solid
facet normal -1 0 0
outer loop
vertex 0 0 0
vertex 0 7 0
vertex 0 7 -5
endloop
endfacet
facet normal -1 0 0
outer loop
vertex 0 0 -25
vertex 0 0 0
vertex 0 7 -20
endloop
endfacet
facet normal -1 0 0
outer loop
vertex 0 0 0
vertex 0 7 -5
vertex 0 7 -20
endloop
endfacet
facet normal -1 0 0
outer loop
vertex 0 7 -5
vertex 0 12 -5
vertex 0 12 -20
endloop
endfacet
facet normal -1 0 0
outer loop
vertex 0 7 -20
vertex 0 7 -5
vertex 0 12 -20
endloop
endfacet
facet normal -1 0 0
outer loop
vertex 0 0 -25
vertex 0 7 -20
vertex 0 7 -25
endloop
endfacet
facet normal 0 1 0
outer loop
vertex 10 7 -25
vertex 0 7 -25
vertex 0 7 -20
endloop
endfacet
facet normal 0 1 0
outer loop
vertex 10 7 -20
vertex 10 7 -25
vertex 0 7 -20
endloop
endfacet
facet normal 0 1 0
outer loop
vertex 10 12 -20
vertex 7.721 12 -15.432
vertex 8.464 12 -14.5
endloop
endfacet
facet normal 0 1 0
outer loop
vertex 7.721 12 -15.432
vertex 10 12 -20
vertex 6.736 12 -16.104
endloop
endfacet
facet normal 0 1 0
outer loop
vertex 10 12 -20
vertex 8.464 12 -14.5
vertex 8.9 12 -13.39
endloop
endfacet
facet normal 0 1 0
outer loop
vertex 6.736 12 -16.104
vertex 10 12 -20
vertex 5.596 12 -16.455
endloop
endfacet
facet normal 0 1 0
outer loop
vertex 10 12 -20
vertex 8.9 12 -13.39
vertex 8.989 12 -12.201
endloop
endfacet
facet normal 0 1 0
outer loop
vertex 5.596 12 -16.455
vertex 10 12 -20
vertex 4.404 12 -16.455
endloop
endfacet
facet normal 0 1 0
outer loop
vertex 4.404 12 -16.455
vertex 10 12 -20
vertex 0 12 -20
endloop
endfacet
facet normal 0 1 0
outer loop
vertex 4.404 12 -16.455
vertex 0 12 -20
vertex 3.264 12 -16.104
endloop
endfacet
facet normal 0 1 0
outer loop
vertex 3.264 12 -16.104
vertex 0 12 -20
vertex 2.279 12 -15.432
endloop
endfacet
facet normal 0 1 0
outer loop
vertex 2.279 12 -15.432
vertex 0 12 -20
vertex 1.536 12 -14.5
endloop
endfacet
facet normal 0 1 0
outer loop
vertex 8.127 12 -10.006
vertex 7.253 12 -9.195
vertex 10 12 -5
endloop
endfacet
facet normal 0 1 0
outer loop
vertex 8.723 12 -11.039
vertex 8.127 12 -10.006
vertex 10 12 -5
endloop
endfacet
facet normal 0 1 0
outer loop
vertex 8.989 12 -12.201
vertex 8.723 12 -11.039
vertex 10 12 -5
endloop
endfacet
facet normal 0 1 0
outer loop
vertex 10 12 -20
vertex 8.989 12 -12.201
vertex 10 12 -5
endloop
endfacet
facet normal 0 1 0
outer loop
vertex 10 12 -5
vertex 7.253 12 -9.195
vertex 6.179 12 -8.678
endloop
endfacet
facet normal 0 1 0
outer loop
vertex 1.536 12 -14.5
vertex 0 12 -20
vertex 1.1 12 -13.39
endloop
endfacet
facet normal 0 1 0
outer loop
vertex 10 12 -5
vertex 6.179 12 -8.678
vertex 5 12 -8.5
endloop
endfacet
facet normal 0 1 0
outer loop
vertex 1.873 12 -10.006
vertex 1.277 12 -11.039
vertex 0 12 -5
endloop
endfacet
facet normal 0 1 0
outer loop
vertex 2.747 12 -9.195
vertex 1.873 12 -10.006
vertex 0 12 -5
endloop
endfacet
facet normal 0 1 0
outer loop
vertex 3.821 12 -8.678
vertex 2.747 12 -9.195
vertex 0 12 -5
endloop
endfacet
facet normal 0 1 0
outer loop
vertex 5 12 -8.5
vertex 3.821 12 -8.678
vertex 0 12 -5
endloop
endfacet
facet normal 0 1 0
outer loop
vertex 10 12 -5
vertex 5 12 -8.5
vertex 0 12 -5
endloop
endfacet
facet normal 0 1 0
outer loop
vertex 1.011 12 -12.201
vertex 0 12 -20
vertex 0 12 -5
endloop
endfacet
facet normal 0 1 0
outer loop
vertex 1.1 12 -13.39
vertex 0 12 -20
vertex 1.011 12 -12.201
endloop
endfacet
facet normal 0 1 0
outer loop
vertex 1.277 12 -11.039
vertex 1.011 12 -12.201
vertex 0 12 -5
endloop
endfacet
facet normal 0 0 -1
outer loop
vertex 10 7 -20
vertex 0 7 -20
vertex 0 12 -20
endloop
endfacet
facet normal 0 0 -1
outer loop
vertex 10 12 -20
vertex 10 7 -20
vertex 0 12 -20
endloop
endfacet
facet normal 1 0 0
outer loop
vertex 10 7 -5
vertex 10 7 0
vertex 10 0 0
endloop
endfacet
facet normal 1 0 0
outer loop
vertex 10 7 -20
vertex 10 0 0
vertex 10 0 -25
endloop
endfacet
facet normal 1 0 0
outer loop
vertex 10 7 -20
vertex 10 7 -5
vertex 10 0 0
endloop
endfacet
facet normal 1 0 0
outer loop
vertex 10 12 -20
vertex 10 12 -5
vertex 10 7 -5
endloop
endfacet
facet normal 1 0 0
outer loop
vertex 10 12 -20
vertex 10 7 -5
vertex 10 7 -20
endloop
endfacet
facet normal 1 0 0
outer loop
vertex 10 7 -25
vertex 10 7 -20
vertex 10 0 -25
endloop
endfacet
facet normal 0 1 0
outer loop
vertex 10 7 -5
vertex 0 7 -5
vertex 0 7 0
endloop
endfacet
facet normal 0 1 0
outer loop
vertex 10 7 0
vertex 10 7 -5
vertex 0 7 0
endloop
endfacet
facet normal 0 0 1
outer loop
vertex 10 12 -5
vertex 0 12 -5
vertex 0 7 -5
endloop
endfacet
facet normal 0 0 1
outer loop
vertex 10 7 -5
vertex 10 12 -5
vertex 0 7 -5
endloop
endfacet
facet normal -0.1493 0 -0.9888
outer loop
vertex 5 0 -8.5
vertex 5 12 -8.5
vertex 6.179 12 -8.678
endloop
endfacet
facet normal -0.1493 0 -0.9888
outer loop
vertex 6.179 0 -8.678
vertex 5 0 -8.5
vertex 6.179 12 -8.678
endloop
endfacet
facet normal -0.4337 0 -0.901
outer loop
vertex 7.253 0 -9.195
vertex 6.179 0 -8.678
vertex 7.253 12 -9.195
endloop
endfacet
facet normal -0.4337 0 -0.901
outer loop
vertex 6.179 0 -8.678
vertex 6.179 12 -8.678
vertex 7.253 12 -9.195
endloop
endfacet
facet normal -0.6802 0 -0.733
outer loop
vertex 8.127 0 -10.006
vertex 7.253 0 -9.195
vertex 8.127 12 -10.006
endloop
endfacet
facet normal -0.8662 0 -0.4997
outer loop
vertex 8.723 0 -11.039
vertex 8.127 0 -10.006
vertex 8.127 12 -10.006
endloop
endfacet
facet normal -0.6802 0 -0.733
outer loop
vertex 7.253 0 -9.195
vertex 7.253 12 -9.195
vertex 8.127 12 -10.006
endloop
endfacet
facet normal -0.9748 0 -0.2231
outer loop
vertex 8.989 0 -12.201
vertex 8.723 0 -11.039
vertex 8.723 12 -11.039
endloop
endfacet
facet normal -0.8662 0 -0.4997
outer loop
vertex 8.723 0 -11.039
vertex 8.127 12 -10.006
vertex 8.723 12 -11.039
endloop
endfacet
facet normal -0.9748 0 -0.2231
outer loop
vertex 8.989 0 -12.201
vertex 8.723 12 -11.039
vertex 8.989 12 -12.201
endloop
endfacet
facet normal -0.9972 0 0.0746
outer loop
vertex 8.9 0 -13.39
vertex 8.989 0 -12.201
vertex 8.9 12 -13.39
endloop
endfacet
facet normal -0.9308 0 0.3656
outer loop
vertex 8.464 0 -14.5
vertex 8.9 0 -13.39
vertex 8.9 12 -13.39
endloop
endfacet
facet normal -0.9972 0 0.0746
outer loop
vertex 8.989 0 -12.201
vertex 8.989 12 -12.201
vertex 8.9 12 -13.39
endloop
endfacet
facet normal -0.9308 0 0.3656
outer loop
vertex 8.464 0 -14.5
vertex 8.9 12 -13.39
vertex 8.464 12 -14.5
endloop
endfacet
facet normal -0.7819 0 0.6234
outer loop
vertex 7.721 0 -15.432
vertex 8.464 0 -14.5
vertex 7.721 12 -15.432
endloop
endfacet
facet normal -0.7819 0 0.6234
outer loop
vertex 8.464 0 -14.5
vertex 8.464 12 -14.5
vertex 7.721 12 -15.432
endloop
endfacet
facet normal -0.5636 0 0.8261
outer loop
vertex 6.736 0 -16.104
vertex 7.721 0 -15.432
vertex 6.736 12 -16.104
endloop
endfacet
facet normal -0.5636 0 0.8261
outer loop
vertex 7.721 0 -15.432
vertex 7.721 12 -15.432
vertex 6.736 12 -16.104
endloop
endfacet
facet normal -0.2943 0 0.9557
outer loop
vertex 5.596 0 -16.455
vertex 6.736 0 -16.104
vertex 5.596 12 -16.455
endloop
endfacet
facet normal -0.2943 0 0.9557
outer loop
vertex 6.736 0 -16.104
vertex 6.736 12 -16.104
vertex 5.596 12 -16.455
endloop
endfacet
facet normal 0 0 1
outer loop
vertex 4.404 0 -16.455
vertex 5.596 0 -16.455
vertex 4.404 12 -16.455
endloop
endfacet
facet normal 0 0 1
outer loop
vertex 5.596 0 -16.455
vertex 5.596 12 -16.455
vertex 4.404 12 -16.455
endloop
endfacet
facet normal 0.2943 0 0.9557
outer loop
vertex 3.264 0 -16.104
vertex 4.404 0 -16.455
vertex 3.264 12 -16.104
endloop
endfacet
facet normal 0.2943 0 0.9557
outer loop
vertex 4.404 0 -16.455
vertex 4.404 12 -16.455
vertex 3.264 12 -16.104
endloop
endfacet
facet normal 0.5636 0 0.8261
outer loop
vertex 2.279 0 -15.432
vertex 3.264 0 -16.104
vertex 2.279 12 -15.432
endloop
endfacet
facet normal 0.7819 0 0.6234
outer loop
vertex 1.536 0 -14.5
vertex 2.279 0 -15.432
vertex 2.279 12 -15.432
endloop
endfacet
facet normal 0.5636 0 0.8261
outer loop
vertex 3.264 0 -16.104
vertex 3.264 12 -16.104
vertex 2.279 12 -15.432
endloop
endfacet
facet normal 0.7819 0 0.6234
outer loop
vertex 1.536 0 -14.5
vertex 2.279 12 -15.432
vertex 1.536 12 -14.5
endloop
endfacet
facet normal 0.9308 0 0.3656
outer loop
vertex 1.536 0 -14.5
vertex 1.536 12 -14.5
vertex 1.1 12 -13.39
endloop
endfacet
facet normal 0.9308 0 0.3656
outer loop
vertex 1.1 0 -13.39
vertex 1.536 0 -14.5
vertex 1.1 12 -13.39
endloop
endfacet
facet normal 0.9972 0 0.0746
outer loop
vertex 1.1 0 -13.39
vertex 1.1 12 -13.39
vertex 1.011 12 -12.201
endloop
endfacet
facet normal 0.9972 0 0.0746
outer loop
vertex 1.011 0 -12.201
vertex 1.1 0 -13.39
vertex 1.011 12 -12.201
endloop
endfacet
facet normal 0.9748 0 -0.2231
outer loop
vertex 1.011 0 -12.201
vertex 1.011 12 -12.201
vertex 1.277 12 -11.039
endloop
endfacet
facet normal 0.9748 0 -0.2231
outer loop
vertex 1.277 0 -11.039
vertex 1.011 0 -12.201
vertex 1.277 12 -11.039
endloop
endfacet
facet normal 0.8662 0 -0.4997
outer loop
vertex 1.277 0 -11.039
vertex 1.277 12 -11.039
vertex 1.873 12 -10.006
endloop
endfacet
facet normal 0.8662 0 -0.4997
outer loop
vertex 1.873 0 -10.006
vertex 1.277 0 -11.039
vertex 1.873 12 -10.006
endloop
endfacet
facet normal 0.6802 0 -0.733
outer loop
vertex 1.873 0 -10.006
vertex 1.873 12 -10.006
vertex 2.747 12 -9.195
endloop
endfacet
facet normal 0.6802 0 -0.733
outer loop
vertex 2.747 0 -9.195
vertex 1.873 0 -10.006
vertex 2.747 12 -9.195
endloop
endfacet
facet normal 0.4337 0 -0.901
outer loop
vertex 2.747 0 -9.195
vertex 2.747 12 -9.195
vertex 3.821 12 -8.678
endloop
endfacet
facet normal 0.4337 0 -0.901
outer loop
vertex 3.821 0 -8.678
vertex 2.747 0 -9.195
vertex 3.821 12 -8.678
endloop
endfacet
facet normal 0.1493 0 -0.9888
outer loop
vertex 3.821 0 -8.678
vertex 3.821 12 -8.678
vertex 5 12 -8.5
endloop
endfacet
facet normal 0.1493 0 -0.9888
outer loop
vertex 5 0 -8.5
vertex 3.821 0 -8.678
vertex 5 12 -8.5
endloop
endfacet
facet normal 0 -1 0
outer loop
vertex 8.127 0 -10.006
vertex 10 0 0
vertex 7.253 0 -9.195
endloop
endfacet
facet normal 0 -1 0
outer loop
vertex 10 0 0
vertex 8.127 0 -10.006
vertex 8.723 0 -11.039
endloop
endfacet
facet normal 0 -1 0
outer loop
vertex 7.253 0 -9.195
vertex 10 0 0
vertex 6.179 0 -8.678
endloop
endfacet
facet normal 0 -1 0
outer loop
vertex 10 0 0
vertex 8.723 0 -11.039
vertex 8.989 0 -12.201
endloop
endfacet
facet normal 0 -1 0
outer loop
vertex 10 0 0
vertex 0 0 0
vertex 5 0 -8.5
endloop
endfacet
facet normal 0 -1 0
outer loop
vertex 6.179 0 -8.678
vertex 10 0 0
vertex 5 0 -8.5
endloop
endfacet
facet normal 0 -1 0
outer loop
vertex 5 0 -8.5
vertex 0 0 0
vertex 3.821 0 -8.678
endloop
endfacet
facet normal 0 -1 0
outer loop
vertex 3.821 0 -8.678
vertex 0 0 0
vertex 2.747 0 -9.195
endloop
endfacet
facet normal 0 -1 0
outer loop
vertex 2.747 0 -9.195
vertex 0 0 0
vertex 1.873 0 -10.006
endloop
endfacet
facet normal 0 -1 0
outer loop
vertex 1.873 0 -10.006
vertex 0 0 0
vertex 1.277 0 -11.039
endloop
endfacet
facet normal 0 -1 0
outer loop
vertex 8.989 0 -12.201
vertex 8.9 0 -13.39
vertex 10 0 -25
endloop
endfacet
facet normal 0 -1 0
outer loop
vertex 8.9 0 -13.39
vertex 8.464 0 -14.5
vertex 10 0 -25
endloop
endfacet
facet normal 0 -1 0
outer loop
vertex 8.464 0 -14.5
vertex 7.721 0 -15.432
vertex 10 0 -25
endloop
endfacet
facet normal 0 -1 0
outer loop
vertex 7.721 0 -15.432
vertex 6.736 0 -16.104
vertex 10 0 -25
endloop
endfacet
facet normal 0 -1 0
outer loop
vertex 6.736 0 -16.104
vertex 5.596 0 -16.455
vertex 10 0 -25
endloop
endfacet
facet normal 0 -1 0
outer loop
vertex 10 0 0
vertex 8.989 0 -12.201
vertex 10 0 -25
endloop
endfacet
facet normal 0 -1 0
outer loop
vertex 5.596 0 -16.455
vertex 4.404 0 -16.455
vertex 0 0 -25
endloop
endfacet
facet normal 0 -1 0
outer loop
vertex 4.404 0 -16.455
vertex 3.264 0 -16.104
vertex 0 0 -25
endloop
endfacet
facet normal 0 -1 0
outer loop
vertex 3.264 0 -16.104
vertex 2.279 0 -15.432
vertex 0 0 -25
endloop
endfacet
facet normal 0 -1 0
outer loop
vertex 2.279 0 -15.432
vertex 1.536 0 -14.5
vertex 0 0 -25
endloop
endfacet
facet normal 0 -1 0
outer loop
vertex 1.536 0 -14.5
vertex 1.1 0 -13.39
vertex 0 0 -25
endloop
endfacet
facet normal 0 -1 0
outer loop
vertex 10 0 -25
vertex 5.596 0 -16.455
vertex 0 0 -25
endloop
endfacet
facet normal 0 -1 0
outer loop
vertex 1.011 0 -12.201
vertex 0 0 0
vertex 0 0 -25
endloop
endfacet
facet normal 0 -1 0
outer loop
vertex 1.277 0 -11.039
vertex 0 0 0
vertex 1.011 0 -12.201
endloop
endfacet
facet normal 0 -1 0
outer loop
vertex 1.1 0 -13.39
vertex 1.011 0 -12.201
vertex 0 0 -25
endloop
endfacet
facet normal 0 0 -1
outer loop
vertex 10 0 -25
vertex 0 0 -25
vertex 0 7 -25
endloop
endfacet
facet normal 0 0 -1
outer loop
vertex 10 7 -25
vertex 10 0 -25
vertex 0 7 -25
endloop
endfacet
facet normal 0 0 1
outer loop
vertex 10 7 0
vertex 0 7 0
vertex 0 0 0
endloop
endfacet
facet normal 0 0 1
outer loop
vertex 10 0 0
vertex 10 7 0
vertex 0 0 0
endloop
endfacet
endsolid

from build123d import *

# Parameters (mm, degrees)
RESSALTO_EXTRUS_O1_DEPTH = 10
ESBO_O6_R                = 4
CORTE_EXTRUS_O2_DEPTH    = 30.478805946


with BuildPart() as part:
    # Esboço2 → Ressalto-extrusão1 (new body)
    with BuildSketch(Plane(origin=(0, 0, 0), x_dir=(0, 0, -1), z_dir=(1, 0, 0))):
        Polygon((0, 0), (25, 0), (25, 7), (20, 7), (20, 12), (5, 12), (5, 7), (0, 7), align=None)
    extrude(amount=RESSALTO_EXTRUS_O1_DEPTH)

    # Esboço6 → Corte-extrusão2 (cut, through all)
    with BuildSketch(Plane(origin=(0, 12, 0), x_dir=(1, 0, 0), z_dir=(0, 1, 0))):
        with Locations(Location((5, 12.5, 0), (0, 0, 270))):
            Circle(ESBO_O6_R)
    extrude(amount=-CORTE_EXTRUS_O2_DEPTH, mode=Mode.SUBTRACT)


solid = part.part
